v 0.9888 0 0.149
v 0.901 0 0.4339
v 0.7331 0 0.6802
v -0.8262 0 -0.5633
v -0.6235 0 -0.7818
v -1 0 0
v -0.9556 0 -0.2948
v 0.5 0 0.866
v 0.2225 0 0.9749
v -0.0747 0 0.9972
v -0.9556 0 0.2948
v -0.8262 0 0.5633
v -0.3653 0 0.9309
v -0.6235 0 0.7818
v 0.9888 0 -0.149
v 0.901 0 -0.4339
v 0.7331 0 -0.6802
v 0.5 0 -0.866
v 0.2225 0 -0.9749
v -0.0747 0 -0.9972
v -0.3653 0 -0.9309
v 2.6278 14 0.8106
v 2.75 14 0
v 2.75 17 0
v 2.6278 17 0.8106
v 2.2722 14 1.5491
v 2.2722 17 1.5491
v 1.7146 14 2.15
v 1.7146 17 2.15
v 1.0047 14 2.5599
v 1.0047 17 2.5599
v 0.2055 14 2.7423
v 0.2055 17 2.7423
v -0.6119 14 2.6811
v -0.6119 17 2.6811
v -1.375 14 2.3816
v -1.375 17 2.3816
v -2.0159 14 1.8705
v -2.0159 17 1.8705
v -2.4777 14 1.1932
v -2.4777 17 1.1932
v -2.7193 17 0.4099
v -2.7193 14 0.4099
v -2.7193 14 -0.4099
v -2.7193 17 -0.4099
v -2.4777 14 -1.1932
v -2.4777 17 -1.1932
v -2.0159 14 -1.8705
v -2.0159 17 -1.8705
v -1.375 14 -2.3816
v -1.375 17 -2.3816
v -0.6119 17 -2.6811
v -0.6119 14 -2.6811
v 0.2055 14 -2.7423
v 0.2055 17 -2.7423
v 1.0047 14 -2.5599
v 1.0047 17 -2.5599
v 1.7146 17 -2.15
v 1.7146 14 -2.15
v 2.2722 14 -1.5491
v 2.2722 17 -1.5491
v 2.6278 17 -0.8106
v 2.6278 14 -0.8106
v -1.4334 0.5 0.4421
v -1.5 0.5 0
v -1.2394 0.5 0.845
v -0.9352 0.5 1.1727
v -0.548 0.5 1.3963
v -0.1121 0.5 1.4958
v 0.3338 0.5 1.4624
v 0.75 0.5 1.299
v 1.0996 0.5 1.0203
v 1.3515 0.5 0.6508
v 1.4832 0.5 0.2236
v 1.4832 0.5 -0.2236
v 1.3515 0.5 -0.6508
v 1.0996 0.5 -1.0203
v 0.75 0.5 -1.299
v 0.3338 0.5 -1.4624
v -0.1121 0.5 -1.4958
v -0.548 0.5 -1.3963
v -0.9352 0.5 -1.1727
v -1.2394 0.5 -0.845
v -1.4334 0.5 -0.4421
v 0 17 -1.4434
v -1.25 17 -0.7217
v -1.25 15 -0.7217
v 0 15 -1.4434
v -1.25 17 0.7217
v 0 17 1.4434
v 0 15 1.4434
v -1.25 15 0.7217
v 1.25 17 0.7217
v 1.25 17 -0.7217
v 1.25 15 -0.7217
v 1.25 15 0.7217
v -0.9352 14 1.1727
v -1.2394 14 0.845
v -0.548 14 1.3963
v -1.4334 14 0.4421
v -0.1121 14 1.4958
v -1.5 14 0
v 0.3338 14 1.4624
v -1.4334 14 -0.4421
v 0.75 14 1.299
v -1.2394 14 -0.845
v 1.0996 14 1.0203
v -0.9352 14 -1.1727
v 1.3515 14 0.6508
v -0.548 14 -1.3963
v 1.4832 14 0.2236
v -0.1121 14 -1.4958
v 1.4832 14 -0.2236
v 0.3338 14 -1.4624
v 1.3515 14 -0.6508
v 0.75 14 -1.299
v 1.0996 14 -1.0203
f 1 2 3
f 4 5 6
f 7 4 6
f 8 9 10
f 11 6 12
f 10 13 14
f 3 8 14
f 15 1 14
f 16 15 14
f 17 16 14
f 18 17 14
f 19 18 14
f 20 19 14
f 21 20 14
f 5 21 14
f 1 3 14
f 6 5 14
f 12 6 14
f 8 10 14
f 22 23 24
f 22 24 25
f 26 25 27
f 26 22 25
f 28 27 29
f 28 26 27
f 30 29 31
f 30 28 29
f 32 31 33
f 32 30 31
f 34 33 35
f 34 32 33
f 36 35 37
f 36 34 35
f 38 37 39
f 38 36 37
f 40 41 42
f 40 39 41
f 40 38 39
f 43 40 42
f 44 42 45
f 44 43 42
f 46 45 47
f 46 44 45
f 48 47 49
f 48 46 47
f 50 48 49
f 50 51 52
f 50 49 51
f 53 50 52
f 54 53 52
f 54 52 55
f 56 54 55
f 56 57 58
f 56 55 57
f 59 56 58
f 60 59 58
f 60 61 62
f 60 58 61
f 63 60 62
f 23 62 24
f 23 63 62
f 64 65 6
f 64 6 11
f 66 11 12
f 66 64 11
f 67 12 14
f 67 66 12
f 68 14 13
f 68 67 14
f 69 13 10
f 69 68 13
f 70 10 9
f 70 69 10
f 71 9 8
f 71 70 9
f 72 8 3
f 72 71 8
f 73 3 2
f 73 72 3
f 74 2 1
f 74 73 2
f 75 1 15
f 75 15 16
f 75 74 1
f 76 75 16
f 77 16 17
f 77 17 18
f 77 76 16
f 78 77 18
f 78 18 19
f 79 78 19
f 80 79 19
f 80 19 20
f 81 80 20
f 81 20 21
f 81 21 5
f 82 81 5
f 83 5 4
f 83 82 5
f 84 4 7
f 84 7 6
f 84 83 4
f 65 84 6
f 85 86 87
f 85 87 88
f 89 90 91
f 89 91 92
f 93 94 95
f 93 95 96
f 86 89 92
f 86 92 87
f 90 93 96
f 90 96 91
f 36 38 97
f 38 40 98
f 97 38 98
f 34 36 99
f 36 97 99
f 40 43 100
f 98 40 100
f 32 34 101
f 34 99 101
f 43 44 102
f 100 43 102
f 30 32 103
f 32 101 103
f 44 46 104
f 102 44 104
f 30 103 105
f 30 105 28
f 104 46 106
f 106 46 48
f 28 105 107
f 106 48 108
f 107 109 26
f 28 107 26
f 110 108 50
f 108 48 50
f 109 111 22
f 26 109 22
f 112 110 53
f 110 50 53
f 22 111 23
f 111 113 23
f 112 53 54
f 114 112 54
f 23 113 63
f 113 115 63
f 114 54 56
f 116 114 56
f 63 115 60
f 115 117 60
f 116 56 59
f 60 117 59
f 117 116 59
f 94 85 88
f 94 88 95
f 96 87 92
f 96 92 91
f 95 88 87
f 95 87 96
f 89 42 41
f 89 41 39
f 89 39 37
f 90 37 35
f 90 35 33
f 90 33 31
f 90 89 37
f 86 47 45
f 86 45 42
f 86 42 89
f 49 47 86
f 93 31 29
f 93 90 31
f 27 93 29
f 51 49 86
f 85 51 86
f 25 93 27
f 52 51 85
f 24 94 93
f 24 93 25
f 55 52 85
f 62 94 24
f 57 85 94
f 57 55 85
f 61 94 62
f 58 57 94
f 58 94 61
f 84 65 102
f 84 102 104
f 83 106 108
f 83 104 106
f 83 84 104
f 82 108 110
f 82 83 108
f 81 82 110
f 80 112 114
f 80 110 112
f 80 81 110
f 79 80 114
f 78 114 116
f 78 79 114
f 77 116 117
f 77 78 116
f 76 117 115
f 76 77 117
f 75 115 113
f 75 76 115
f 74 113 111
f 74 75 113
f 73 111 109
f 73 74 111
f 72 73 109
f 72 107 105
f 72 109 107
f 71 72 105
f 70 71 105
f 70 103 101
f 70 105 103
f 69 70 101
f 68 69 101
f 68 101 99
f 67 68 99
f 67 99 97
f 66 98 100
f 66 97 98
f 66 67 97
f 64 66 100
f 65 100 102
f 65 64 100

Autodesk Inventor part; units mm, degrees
ref_plane "YZ Plane" through (0, 0, 0) normal (1, 0, 0) x (0, 1, 0)
ref_plane "XZ Plane" through (0, 0, 0) normal (0, 1, 0) x (-1, 0, 0)
ref_plane "XY Plane" through (0, 0, 0) normal (0, 0, 1) x (1, 0, 0)
sketch "Sketch1" plane through (0, 0, 0) normal (0, 1, 0) x (-1, 0, 0)
  circle A0 centre (0, 0) radius 1.5
  dimension "d0" = 3
extrude "Extrusion1" add sketch "Sketch1" along normal blind 14
sketch "Sketch2" plane through (0, 14, 0) normal (0, 1, 0) x (1, 0, 0)
  circle A0 centre (0, 0) radius 1.5 projected
  circle A1 centre (0, 0) radius 2.75
  dimension "d3" = 5.5
extrude "Extrusion2" add sketch "Sketch2" along normal blind 3 contours A0 | A1
sketch "Sketch3" plane through (0, 17, 0) normal (0, 1, 0) x (1, 0, 0)
  circle A0 centre (0, 0) radius 2.75 projected
  line L0 (0, 1.4434) -> (1.25, 0.7217)
  line L1 (1.25, 0.7217) -> (1.25, -0.7217)
  line L2 (1.25, -0.7217) -> (0, -1.4434)
  line L3 (0, -1.4434) -> (-1.25, -0.7217)
  line L4 (-1.25, -0.7217) -> (-1.25, 0.7217)
  line L5 (-1.25, 0.7217) -> (0, 1.4434)
  dimension "d6" = 2.5
extrude "Extrusion3" cut sketch "Sketch3" against normal blind 2 contours L0 L1 L2 L3 L4 L5
thread "Thread1" size "M3x0.5" class "6g" standard "ANSI Metric M Profile" full length
chamfer "Chamfer1" distance 0.5 angle 45 1 edges at (1.5, 0, 0)
properties part number "M3x14SHCS"
